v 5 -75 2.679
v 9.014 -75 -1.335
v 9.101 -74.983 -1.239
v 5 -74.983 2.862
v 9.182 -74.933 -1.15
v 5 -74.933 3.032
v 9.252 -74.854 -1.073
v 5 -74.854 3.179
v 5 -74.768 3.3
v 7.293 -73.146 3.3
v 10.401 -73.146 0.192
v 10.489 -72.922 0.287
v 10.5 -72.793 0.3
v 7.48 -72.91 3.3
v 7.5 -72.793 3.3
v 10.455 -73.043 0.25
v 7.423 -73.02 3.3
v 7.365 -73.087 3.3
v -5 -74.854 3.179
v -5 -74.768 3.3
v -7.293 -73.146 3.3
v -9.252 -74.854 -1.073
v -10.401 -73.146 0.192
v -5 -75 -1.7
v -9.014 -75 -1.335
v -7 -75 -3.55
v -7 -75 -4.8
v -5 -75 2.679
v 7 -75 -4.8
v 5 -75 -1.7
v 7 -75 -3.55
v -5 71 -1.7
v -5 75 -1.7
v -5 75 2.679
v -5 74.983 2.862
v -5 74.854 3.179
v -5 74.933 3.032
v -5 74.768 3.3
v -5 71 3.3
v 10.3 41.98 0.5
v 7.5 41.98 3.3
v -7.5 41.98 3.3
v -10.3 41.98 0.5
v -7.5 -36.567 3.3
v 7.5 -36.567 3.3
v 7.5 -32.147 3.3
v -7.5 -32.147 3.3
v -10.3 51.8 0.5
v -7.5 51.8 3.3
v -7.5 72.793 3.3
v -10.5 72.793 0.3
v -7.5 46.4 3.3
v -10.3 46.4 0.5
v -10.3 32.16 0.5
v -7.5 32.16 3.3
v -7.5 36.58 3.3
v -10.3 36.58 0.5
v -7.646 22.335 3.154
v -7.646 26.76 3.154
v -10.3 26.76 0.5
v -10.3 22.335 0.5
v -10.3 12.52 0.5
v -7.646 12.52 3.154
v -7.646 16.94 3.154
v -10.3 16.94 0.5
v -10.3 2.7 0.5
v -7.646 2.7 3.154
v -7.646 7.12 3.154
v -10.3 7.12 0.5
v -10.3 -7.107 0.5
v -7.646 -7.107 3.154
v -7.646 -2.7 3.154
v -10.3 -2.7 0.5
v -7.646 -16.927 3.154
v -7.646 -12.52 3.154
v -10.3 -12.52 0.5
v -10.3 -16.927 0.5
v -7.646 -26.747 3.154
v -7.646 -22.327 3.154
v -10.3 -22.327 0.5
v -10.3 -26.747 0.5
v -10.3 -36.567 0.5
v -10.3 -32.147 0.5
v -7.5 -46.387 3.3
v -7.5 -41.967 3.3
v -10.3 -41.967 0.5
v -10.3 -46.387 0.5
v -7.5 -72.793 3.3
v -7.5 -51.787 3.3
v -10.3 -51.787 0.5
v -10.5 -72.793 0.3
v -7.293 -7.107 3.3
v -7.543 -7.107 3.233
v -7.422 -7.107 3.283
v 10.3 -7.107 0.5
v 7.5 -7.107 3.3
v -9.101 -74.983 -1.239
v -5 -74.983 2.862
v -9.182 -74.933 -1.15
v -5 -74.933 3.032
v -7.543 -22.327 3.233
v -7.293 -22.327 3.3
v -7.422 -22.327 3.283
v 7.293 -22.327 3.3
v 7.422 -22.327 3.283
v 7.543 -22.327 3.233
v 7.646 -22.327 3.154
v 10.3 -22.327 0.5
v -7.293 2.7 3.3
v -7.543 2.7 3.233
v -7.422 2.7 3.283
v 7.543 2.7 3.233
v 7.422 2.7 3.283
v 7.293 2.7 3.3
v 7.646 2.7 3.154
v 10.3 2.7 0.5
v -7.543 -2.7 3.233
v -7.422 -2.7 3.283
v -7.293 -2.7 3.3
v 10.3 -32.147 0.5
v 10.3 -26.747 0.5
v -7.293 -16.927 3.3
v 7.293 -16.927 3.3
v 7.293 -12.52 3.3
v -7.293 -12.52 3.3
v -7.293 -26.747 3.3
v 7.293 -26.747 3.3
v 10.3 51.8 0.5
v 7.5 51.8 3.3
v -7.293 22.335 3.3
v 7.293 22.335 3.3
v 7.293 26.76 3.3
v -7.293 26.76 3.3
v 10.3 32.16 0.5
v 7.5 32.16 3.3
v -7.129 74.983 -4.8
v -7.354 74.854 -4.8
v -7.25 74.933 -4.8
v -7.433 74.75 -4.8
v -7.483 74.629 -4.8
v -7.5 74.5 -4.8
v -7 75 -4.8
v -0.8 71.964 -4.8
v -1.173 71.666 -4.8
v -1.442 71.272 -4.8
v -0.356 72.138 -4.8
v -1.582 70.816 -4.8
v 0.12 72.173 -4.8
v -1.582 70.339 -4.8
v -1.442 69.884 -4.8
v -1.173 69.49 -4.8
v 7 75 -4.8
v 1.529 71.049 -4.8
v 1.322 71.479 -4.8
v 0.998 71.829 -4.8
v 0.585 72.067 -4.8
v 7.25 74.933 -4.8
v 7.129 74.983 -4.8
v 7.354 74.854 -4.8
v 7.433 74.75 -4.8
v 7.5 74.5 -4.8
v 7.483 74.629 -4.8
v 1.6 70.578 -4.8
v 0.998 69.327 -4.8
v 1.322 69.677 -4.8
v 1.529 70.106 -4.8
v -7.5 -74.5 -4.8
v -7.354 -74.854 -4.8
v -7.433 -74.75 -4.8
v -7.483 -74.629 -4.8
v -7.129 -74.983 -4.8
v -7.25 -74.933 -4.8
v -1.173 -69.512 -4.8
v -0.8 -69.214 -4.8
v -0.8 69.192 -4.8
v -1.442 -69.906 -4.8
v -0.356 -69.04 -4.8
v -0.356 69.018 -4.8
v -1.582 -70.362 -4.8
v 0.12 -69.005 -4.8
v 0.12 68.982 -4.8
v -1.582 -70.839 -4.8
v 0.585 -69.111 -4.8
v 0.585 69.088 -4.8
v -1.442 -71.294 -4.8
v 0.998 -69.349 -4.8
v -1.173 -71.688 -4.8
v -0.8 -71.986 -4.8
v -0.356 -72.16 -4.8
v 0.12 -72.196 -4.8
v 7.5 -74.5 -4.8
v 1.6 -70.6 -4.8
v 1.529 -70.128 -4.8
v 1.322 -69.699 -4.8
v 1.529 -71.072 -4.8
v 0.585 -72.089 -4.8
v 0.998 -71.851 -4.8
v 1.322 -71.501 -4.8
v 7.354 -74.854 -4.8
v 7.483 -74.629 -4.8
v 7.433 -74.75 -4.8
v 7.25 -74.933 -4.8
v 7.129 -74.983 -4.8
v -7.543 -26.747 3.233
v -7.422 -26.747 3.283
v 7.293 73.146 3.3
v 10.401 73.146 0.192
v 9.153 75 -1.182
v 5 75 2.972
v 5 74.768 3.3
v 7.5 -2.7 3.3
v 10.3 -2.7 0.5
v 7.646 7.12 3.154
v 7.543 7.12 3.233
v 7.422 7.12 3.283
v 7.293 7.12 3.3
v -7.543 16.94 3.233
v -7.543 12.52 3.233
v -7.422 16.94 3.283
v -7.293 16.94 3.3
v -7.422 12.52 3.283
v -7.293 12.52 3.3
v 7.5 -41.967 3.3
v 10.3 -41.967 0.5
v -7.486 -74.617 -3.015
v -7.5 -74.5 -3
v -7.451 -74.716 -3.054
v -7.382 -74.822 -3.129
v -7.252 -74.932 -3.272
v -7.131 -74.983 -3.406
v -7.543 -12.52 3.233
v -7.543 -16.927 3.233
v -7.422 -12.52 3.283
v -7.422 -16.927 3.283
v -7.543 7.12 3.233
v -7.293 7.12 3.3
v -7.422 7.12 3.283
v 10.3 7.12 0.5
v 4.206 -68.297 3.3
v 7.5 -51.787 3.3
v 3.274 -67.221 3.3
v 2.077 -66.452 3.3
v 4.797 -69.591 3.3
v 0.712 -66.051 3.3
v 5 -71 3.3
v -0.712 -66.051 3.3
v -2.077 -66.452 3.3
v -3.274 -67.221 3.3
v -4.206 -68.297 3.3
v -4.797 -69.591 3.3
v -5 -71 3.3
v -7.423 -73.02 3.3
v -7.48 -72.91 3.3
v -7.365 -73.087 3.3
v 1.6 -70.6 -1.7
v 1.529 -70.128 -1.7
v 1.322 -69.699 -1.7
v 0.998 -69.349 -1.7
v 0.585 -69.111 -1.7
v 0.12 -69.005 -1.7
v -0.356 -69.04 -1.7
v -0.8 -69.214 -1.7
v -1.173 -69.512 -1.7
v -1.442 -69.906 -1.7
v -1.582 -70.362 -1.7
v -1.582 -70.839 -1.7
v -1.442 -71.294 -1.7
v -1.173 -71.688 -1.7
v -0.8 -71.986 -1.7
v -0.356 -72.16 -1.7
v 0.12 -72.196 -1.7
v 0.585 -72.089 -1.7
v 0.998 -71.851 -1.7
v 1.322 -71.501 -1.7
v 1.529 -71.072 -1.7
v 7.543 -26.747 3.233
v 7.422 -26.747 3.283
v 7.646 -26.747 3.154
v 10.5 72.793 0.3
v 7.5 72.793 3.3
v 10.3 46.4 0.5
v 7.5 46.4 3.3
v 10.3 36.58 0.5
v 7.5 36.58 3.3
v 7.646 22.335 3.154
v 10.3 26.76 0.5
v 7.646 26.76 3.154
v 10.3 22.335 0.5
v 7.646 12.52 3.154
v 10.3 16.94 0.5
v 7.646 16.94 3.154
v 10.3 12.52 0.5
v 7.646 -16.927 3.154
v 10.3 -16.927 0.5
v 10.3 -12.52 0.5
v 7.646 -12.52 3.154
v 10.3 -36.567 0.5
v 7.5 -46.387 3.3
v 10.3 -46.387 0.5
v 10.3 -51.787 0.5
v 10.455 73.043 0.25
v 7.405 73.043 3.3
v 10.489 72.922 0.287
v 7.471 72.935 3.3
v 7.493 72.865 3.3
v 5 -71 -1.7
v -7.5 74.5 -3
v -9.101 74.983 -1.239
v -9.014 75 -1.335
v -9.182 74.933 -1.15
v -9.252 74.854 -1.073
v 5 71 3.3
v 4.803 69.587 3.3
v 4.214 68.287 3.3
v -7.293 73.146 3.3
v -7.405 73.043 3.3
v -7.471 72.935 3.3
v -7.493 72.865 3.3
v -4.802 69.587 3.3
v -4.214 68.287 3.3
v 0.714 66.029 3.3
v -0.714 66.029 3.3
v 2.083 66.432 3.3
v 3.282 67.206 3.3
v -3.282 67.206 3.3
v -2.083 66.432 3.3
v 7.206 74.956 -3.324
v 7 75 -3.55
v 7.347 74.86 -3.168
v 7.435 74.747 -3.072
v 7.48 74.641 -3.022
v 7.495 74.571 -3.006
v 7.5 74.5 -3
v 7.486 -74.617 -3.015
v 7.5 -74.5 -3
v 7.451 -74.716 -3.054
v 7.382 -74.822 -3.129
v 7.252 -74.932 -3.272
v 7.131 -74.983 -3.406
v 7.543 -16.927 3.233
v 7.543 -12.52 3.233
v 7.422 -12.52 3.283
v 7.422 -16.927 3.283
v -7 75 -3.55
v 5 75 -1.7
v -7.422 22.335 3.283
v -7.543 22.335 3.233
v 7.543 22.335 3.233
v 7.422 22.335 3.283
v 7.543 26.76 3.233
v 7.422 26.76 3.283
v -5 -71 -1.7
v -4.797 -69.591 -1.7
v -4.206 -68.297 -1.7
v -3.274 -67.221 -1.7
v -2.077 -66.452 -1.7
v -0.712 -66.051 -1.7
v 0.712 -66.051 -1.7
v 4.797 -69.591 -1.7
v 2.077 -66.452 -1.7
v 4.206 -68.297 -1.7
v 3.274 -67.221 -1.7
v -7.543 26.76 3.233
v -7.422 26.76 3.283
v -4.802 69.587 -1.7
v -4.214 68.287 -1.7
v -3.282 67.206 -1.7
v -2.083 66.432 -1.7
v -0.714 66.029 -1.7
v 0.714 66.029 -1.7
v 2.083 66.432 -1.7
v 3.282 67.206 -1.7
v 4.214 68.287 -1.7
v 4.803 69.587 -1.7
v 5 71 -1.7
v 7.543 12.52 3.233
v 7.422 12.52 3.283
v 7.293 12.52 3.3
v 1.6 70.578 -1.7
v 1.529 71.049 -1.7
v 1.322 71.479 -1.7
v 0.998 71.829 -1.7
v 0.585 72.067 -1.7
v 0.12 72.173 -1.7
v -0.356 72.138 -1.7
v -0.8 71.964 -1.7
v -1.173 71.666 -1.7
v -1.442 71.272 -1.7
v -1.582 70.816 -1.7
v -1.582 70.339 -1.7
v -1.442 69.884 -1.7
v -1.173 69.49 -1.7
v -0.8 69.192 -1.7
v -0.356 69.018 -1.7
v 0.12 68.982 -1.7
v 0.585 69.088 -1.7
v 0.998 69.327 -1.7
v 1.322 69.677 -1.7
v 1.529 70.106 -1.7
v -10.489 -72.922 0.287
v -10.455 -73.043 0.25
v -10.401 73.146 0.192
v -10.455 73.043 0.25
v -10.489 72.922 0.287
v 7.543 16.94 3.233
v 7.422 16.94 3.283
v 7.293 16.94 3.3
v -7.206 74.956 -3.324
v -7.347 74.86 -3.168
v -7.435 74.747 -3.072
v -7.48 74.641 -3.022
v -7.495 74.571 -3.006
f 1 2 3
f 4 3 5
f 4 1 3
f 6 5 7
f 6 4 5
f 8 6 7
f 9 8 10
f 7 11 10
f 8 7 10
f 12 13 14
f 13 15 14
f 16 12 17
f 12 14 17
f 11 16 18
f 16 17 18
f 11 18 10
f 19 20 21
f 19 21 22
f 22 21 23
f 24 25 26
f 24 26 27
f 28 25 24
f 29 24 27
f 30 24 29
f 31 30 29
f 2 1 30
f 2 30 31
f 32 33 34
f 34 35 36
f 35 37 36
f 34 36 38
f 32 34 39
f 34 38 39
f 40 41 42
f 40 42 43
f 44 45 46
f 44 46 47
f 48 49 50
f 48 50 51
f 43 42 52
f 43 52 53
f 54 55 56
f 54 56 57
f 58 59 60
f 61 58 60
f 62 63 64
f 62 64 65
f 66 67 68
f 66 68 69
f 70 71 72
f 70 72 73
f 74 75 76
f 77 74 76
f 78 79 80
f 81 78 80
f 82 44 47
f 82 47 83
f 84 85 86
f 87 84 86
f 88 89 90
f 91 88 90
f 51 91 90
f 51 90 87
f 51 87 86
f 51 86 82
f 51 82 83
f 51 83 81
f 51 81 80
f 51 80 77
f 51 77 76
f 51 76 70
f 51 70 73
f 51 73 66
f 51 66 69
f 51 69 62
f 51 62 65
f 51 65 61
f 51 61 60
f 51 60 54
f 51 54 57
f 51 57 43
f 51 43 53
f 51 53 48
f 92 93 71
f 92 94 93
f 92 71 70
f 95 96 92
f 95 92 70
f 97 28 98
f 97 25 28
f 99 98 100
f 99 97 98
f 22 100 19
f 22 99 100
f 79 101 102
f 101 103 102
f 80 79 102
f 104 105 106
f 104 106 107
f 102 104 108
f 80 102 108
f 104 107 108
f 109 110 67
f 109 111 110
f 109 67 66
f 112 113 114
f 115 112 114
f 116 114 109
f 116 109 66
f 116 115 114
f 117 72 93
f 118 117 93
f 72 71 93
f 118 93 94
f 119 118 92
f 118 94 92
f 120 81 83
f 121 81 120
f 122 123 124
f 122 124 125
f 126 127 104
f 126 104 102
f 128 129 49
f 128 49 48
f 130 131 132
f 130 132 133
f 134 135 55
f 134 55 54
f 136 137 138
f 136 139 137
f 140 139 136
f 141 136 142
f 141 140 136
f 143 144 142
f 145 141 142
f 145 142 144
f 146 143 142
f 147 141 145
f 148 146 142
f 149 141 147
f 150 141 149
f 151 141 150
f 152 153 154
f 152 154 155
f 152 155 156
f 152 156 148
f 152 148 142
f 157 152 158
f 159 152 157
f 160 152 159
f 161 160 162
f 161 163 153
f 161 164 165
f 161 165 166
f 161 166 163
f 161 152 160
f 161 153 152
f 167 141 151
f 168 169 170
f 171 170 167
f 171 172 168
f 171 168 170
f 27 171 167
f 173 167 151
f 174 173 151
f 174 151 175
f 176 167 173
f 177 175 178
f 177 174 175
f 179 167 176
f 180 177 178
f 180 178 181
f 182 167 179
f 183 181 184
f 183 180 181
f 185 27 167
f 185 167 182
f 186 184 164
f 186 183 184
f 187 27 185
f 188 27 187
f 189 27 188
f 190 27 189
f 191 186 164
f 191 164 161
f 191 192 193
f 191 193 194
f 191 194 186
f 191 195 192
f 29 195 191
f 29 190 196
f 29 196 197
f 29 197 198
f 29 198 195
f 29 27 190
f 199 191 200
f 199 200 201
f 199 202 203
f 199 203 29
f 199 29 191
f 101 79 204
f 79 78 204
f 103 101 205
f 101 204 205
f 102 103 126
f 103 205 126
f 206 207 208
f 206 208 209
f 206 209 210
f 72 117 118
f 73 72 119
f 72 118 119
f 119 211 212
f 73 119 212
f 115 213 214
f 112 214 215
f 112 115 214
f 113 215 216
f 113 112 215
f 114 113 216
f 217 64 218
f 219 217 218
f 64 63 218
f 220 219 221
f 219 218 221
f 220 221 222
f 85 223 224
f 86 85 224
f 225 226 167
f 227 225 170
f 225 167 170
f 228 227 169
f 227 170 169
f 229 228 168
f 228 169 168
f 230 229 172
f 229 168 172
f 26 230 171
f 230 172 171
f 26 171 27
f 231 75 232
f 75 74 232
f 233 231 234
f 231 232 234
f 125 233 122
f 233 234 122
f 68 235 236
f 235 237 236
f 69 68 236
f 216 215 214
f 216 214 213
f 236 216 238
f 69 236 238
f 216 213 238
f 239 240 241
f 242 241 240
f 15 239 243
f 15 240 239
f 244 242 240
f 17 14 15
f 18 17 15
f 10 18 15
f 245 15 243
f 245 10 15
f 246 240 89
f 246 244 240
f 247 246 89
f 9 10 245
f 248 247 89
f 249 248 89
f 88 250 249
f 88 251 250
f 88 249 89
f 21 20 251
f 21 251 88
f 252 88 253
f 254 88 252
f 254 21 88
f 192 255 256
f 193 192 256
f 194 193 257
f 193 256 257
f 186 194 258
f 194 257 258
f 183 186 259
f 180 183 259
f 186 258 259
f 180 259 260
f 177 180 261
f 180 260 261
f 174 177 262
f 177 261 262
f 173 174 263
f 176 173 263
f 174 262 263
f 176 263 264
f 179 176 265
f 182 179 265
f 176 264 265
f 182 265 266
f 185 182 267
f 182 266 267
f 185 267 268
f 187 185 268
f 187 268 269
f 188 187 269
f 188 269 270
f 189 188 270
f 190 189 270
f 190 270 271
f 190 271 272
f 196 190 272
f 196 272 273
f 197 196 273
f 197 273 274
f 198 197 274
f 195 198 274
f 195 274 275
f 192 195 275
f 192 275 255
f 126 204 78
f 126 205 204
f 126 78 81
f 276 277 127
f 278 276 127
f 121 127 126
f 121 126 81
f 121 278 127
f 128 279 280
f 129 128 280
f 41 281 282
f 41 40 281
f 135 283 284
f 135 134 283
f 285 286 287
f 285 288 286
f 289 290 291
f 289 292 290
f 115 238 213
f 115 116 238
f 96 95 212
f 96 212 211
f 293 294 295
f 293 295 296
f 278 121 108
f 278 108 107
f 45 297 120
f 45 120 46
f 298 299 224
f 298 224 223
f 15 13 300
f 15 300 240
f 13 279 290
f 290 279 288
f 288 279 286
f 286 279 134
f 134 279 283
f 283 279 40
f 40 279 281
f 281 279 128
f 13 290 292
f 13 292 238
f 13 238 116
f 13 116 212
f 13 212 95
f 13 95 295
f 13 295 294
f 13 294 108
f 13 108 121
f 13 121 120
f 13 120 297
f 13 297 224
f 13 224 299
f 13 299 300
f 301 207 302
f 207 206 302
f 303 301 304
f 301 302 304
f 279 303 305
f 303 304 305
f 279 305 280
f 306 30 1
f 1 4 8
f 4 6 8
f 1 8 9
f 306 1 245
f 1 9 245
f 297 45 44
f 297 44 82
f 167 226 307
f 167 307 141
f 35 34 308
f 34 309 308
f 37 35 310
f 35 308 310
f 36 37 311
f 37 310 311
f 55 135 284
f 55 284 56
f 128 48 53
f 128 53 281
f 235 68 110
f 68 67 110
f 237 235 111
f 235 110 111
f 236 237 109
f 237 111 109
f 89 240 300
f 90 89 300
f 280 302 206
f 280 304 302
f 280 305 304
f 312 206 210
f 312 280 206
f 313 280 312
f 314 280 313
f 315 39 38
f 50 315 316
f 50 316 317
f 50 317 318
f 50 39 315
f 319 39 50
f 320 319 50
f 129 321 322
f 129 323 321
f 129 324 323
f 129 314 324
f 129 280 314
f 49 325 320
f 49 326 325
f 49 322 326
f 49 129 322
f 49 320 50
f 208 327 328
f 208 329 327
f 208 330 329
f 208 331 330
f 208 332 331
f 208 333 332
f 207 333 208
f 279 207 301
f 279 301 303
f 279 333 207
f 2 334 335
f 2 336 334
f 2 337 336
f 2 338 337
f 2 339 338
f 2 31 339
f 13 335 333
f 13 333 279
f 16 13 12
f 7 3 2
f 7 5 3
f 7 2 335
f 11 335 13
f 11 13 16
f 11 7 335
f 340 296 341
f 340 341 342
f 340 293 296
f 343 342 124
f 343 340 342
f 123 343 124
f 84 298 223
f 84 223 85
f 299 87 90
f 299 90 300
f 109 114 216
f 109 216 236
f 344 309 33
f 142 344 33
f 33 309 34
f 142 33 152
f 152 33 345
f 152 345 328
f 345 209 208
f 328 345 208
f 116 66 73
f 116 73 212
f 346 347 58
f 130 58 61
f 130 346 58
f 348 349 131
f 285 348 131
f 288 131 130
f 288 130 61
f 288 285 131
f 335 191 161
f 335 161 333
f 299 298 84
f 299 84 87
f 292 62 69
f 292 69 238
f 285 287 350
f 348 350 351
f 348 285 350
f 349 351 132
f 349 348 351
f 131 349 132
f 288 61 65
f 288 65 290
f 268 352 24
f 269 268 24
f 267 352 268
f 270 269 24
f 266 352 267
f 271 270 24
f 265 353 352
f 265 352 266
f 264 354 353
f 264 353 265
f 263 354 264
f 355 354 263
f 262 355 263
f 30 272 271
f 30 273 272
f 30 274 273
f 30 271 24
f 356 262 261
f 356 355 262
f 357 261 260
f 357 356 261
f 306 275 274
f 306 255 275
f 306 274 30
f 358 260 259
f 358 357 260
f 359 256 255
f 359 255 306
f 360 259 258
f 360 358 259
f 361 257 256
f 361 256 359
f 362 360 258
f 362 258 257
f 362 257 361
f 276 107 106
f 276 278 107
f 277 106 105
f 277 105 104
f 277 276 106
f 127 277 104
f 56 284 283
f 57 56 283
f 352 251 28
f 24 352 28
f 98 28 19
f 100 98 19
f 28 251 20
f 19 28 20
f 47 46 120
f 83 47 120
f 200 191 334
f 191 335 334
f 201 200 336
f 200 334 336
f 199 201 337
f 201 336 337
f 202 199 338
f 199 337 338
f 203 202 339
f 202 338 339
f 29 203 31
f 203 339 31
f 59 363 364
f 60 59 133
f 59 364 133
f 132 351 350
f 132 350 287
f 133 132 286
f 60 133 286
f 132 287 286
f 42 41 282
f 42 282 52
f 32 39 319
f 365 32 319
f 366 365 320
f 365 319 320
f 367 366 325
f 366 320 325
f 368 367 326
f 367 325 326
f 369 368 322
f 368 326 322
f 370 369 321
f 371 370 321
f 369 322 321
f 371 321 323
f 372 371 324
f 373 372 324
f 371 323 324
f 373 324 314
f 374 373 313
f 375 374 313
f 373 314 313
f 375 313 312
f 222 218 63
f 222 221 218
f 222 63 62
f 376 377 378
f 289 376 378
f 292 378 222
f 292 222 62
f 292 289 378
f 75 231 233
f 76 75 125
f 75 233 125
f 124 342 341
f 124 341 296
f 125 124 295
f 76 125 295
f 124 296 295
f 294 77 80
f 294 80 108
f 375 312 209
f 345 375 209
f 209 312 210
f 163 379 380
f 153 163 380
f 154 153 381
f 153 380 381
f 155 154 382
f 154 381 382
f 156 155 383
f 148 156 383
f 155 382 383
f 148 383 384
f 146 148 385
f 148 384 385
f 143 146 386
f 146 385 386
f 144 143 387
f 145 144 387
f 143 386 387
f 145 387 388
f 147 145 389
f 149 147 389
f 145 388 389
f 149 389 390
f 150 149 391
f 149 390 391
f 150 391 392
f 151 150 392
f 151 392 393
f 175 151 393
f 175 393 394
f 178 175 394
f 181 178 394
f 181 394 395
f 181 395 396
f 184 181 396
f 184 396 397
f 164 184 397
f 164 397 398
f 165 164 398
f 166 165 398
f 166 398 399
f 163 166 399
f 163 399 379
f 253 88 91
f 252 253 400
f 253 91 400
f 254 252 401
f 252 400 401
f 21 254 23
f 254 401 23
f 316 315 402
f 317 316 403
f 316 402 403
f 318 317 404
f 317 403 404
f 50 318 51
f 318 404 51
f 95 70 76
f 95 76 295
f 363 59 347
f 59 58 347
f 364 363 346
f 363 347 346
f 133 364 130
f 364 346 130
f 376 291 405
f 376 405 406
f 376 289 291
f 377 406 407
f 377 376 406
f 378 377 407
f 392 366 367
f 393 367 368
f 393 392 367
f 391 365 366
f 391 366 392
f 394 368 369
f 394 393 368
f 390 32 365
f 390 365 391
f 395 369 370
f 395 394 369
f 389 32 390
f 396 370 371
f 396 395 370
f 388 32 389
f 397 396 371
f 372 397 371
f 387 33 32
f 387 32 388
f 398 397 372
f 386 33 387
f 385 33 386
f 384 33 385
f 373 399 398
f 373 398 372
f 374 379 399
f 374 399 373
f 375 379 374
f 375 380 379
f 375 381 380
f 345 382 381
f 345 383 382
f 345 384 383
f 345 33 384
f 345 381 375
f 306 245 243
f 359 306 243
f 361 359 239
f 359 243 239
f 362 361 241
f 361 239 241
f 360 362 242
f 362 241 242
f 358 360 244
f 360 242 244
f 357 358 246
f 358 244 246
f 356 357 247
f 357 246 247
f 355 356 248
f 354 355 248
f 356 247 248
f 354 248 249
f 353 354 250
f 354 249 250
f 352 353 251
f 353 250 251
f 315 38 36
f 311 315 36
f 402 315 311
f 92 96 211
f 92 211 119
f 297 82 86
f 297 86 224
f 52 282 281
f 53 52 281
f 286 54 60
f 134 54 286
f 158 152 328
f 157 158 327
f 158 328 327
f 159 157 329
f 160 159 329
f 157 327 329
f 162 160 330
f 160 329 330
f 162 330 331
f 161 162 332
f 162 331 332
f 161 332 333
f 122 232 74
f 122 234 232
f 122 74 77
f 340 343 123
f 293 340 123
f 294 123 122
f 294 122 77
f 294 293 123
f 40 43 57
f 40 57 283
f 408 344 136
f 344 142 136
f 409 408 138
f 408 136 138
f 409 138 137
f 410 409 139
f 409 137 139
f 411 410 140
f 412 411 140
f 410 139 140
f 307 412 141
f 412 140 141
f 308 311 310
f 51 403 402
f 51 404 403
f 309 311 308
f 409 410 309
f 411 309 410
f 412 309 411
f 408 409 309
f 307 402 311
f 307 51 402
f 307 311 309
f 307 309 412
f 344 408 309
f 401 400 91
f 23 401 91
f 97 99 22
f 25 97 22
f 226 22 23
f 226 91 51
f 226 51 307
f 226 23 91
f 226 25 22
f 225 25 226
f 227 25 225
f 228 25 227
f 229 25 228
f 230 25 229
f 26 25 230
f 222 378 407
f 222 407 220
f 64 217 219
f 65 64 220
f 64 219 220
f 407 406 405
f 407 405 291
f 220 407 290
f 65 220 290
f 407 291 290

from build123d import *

# Parameters (mm, degrees)
F1_DEPTH = 75
F2_W     = 28
F2_H     = 5.4
F2_W_2   = 28.1193151165
F2_H_2   = 5.3996254659
F2_W_3   = 28.3288413435
F2_H_3   = 5.3951430639
F2_W_4   = 28.8207556829
F2_W_5   = 28.5256083831
F2_H_4   = 5.4125102987
F2_W_6   = 29.607820116
F2_W_7   = 29.9029674158
F3_DEPTH = 2.8
F5_DEPTH = 5
F6_R     = 1.6
F7_DEPTH = 3.101
F8_SIZE  = 2
F9_R     = 0.5


with BuildPart() as f1:
    # F0 (on Front) → F1 (new body, symmetric)
    with BuildSketch(Plane.XZ):
        Polygon((-7.5, -4.8), (7.5, -4.8), (7.5, -3), (10.5, 0.3), (7.5, 3.3), (-7.5, 3.3), (-10.5, 0.3), (-7.5, -3), align=None)
    extrude(amount=F1_DEPTH, both=True)

    # F2 (on face) → F3 (cut)
    with BuildSketch(Plane.XY.offset(3.3)):
        Rectangle(F2_W, F2_H)
        with Locations((0.0596575582, 9.8198127329)):
            Rectangle(F2_W_2, F2_H_2)
        with Locations((0.1644206718, 19.6375715319)):
            Rectangle(F2_W_3, F2_H_3)
        with Locations((0.4103778414, 29.46)):
            Rectangle(F2_W_4, F2_H)
        with Locations((0.2628041916, -9.8137448507)):
            Rectangle(F2_W_5, F2_H_4)
        with Locations((0.803910058, -19.6274897013)):
            Rectangle(F2_W_6, F2_H)
        with Locations((0.9514837079, -29.4474897013)):
            Rectangle(F2_W_7, F2_H)
        with Locations((0.4103778414, 39.28)):
            Rectangle(F2_W_4, F2_H)
        with Locations((0.4103778414, 49.1)):
            Rectangle(F2_W_4, F2_H)
        with Locations((0.9514837079, -39.2674897013)):
            Rectangle(F2_W_7, F2_H)
        with Locations((0.9514837079, -49.0874897013)):
            Rectangle(F2_W_7, F2_H)
    extrude(amount=-F3_DEPTH, mode=Mode.SUBTRACT)

    # F4 (on face) → F5 (cut)
    with BuildSketch(Plane.XY.offset(3.3)):
        with BuildLine():
            Line((-4.9999021515, -71), (-4.9999021515, -73))
            Line((-4.9999021515, -73), (-4.9999021515, -75))
            Line((-4.9999021515, -75), (5, -75))
            Line((5, -75), (5, -73))
            Line((5, -73), (5, -71))
            ThreePointArc((5, -71), (4.89242e-05, -66.0000489242), (-4.9999021515, -71))
        make_face()
        with BuildLine():
            ThreePointArc((-4.9999021515, 71), (4.89242e-05, 65.9778812301), (5, 71))
            Line((5, 71), (5, 73))
            Line((5, 73), (5, 75))
            Line((5, 75), (-4.9999021515, 75))
            Line((-4.9999021515, 75), (-4.9999021515, 73))
            Line((-4.9999021515, 73), (-4.9999021515, 71))
        make_face()
    extrude(amount=-F5_DEPTH, mode=Mode.SUBTRACT)

    # F6 (on face) → F7 (cut, through all)
    with BuildSketch(Plane.XY.offset(-1.7)):
        with Locations((0, -70.6000489272)):
            Circle(F6_R)
        with Locations((0, 70.5778812331)):
            Circle(F6_R)
    extrude(amount=-F7_DEPTH, mode=Mode.SUBTRACT)

    # F8
    f8_edges = [f1.edges().sort_by_distance(p)[0] for p in [
        (9, 75, 1.8),
        (-9, 75, 1.8),
        (9, -75, 1.8),
        (-9, -75, 1.8),
    ]]
    chamfer(f8_edges, length=F8_SIZE)

    # F9
    f9_edges = [f1.edges().sort_by_distance(p)[0] for p in [
        (-7.5, 24.547572, 3.3),
        (-7.5, 14.729813, 3.3),
        (-7.5, 4.91, 3.3),
        (-7.5, -4.903745, 3.3),
        (-7.5, -14.723745, 3.3),
        (-7.5, -24.53749, 3.3),
        (7.5, -24.53749, 3.3),
        (7.5, -14.723745, 3.3),
        (7.5, 4.91, 3.3),
        (7.5, 14.729813, 3.3),
        (7.5, 24.547572, 3.3),
        (-7.076516, 75, 0.895057),
        (9, 73, 1.8),
        (-9, 73, 1.8),
        (7.076565, -75, 0.895008),
        (9, -73, 1.8),
        (-7.076516, -75, 0.895057),
        (-9, -73, 1.8),
        (-7.5, -75, -3.9),
        (7.5, -75, -3.9),
        (7.5, 75, -3.9),
        (-7.5, 75, -3.9),
    ]]
    fillet(f9_edges, radius=F9_R)


solid = f1.part
